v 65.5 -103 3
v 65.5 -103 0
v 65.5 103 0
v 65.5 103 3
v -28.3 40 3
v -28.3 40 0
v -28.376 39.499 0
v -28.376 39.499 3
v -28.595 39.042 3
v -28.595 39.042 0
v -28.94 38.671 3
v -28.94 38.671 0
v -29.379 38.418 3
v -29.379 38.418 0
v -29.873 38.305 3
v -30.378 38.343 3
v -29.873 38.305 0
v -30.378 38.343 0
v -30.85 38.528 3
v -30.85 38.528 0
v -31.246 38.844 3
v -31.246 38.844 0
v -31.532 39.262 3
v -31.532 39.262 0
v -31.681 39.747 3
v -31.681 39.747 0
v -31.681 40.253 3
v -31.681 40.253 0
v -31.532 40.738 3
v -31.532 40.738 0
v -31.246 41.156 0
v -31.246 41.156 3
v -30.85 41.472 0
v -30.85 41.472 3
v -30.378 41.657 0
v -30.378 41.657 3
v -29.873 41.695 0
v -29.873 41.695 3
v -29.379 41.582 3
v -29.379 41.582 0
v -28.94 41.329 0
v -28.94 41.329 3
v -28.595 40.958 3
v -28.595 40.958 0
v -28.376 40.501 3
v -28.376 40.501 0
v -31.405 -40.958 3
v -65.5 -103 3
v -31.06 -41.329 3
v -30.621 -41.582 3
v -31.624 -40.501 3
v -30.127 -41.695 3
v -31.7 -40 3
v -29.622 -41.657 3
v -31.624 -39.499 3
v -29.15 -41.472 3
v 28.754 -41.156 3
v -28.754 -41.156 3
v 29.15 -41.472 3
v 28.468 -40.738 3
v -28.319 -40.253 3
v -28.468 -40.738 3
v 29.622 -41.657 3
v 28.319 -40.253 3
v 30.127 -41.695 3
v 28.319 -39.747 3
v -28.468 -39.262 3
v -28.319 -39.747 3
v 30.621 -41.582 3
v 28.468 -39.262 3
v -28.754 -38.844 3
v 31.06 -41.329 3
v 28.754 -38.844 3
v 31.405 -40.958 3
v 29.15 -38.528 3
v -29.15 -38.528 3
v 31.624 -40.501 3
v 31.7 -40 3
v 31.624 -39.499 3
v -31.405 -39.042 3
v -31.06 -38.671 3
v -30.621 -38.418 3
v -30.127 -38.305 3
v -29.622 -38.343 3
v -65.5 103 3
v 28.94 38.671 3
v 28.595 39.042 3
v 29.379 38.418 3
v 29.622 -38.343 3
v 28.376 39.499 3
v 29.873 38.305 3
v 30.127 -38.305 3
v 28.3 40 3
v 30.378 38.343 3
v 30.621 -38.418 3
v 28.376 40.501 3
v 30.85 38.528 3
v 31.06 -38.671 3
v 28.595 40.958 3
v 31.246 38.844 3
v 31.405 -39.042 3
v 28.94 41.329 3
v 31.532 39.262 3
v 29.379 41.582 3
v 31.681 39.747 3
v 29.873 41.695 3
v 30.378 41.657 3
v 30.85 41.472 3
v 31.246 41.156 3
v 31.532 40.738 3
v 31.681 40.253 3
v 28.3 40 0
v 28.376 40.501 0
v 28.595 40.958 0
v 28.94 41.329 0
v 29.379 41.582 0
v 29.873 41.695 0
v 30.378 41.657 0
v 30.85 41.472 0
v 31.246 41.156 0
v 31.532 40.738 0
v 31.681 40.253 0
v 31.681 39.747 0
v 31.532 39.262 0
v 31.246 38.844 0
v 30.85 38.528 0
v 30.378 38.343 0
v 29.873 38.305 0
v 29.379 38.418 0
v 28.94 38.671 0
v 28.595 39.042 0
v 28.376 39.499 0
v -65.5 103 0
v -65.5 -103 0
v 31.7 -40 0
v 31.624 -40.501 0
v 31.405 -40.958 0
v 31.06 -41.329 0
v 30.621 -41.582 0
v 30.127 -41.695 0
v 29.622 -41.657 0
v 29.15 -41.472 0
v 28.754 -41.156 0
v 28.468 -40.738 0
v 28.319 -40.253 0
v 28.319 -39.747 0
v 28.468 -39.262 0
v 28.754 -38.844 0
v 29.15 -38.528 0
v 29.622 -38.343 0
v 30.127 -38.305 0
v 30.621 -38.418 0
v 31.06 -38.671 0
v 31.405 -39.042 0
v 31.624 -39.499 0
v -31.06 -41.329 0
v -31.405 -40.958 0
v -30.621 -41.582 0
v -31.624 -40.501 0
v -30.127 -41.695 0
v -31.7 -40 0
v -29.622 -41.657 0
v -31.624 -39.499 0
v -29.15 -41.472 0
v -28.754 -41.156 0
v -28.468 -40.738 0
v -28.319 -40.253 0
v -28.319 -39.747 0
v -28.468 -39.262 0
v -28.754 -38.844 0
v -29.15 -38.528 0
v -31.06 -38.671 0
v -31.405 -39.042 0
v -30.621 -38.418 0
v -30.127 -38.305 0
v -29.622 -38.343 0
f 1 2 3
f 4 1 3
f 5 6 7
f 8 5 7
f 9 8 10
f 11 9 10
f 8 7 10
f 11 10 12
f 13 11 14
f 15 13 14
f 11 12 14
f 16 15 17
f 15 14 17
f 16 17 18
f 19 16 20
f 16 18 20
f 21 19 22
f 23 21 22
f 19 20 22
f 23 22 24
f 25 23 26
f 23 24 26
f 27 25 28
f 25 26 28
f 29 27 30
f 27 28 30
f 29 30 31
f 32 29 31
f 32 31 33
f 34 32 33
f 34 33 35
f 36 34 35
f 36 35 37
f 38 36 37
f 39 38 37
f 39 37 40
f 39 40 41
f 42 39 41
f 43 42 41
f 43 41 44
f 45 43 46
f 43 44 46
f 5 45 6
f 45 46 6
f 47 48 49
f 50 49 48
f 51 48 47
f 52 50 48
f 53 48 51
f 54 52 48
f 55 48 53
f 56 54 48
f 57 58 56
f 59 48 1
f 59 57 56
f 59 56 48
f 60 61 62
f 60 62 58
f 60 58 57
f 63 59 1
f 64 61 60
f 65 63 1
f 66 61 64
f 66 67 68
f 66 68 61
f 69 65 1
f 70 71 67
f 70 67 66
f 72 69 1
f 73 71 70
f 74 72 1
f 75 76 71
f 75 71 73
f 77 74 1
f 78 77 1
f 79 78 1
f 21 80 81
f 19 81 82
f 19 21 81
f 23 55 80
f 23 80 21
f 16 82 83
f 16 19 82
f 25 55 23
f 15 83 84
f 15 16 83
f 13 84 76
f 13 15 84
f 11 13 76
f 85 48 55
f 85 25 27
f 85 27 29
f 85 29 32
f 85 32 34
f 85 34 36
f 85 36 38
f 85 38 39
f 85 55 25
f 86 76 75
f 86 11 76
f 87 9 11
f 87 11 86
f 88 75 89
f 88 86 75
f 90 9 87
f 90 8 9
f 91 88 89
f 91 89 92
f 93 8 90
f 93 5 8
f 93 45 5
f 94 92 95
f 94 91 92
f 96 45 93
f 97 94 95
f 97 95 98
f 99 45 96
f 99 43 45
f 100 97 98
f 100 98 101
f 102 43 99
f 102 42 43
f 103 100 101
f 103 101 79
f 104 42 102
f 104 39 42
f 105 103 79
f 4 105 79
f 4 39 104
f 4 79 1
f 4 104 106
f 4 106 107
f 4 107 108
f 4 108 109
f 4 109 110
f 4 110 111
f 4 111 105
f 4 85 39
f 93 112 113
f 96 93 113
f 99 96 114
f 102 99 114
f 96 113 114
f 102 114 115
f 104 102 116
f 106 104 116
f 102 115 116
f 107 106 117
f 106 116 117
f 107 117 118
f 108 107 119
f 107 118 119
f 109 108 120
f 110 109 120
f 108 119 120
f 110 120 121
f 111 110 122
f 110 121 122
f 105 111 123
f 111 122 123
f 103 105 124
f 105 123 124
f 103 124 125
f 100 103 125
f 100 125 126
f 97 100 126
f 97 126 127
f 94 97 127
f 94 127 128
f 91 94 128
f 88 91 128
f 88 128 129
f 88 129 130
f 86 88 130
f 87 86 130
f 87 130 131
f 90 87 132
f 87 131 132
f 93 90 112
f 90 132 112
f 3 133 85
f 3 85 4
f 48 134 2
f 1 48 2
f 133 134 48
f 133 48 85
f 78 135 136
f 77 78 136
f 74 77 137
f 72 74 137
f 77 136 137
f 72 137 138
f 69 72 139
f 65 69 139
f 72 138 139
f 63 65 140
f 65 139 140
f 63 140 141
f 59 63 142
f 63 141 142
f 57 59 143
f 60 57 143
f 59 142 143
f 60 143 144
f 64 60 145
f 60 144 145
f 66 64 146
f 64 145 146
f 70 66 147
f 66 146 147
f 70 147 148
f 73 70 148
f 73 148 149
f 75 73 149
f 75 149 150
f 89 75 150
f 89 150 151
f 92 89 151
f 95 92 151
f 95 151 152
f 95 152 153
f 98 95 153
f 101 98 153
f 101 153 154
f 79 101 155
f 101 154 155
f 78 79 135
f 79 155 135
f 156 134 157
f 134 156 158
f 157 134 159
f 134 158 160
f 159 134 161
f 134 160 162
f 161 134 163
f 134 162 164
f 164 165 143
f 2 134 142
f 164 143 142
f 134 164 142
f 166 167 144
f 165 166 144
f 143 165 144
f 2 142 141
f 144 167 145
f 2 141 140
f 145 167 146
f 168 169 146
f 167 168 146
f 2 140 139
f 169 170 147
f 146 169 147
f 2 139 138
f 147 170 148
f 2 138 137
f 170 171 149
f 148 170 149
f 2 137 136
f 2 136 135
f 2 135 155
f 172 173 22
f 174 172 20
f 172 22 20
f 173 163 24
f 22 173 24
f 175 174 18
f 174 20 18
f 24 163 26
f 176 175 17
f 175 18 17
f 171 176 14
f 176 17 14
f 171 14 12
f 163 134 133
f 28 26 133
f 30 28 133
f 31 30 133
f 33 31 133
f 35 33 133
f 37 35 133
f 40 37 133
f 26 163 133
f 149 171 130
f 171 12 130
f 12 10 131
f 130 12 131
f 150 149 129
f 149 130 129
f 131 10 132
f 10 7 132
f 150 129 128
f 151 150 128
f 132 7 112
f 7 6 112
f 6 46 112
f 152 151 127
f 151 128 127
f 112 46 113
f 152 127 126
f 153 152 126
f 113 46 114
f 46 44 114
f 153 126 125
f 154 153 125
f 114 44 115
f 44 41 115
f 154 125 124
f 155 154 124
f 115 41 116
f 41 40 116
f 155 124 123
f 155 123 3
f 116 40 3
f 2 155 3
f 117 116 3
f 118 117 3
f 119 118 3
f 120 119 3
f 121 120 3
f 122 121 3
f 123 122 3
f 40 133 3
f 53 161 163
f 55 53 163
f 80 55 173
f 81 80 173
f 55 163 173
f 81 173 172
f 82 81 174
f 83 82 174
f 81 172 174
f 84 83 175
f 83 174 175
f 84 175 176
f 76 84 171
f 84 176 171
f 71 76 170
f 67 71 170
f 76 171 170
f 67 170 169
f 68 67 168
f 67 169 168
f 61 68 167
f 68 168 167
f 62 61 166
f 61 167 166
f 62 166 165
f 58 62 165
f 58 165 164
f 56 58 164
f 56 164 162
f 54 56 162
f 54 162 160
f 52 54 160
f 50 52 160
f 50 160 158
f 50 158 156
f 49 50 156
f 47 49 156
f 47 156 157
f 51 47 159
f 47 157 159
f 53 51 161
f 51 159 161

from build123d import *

# Parameters (mm, degrees)
SKETCH2_W           = 131
SKETCH2_H           = 206
BOSS_EXTRUDE1_DEPTH = 3
SKETCH3_R           = 1.7
CUT_EXTRUDE1_DEPTH  = 3


with BuildPart() as part:
    # Sketch2 → Boss-Extrude1 (new body)
    with BuildSketch(Plane.XY):
        Rectangle(SKETCH2_W, SKETCH2_H)
    extrude(amount=BOSS_EXTRUDE1_DEPTH)

    # Sketch3 → Cut-Extrude1 (cut)
    with BuildSketch(Plane(origin=(0, 0, 0), x_dir=(-1, 0, 0), z_dir=(0, 0, -1))):
        with Locations((-30, 40)):
            Circle(SKETCH3_R)
        with Locations(Location((-30, -40, 0), (0, 0, 180))):
            Circle(SKETCH3_R)
        with Locations((30, -40)):
            Circle(SKETCH3_R)
        with Locations(Location((30, 40, 0), (0, 0, 180))):
            Circle(SKETCH3_R)
    extrude(amount=-CUT_EXTRUDE1_DEPTH, mode=Mode.SUBTRACT)


solid = part.part
